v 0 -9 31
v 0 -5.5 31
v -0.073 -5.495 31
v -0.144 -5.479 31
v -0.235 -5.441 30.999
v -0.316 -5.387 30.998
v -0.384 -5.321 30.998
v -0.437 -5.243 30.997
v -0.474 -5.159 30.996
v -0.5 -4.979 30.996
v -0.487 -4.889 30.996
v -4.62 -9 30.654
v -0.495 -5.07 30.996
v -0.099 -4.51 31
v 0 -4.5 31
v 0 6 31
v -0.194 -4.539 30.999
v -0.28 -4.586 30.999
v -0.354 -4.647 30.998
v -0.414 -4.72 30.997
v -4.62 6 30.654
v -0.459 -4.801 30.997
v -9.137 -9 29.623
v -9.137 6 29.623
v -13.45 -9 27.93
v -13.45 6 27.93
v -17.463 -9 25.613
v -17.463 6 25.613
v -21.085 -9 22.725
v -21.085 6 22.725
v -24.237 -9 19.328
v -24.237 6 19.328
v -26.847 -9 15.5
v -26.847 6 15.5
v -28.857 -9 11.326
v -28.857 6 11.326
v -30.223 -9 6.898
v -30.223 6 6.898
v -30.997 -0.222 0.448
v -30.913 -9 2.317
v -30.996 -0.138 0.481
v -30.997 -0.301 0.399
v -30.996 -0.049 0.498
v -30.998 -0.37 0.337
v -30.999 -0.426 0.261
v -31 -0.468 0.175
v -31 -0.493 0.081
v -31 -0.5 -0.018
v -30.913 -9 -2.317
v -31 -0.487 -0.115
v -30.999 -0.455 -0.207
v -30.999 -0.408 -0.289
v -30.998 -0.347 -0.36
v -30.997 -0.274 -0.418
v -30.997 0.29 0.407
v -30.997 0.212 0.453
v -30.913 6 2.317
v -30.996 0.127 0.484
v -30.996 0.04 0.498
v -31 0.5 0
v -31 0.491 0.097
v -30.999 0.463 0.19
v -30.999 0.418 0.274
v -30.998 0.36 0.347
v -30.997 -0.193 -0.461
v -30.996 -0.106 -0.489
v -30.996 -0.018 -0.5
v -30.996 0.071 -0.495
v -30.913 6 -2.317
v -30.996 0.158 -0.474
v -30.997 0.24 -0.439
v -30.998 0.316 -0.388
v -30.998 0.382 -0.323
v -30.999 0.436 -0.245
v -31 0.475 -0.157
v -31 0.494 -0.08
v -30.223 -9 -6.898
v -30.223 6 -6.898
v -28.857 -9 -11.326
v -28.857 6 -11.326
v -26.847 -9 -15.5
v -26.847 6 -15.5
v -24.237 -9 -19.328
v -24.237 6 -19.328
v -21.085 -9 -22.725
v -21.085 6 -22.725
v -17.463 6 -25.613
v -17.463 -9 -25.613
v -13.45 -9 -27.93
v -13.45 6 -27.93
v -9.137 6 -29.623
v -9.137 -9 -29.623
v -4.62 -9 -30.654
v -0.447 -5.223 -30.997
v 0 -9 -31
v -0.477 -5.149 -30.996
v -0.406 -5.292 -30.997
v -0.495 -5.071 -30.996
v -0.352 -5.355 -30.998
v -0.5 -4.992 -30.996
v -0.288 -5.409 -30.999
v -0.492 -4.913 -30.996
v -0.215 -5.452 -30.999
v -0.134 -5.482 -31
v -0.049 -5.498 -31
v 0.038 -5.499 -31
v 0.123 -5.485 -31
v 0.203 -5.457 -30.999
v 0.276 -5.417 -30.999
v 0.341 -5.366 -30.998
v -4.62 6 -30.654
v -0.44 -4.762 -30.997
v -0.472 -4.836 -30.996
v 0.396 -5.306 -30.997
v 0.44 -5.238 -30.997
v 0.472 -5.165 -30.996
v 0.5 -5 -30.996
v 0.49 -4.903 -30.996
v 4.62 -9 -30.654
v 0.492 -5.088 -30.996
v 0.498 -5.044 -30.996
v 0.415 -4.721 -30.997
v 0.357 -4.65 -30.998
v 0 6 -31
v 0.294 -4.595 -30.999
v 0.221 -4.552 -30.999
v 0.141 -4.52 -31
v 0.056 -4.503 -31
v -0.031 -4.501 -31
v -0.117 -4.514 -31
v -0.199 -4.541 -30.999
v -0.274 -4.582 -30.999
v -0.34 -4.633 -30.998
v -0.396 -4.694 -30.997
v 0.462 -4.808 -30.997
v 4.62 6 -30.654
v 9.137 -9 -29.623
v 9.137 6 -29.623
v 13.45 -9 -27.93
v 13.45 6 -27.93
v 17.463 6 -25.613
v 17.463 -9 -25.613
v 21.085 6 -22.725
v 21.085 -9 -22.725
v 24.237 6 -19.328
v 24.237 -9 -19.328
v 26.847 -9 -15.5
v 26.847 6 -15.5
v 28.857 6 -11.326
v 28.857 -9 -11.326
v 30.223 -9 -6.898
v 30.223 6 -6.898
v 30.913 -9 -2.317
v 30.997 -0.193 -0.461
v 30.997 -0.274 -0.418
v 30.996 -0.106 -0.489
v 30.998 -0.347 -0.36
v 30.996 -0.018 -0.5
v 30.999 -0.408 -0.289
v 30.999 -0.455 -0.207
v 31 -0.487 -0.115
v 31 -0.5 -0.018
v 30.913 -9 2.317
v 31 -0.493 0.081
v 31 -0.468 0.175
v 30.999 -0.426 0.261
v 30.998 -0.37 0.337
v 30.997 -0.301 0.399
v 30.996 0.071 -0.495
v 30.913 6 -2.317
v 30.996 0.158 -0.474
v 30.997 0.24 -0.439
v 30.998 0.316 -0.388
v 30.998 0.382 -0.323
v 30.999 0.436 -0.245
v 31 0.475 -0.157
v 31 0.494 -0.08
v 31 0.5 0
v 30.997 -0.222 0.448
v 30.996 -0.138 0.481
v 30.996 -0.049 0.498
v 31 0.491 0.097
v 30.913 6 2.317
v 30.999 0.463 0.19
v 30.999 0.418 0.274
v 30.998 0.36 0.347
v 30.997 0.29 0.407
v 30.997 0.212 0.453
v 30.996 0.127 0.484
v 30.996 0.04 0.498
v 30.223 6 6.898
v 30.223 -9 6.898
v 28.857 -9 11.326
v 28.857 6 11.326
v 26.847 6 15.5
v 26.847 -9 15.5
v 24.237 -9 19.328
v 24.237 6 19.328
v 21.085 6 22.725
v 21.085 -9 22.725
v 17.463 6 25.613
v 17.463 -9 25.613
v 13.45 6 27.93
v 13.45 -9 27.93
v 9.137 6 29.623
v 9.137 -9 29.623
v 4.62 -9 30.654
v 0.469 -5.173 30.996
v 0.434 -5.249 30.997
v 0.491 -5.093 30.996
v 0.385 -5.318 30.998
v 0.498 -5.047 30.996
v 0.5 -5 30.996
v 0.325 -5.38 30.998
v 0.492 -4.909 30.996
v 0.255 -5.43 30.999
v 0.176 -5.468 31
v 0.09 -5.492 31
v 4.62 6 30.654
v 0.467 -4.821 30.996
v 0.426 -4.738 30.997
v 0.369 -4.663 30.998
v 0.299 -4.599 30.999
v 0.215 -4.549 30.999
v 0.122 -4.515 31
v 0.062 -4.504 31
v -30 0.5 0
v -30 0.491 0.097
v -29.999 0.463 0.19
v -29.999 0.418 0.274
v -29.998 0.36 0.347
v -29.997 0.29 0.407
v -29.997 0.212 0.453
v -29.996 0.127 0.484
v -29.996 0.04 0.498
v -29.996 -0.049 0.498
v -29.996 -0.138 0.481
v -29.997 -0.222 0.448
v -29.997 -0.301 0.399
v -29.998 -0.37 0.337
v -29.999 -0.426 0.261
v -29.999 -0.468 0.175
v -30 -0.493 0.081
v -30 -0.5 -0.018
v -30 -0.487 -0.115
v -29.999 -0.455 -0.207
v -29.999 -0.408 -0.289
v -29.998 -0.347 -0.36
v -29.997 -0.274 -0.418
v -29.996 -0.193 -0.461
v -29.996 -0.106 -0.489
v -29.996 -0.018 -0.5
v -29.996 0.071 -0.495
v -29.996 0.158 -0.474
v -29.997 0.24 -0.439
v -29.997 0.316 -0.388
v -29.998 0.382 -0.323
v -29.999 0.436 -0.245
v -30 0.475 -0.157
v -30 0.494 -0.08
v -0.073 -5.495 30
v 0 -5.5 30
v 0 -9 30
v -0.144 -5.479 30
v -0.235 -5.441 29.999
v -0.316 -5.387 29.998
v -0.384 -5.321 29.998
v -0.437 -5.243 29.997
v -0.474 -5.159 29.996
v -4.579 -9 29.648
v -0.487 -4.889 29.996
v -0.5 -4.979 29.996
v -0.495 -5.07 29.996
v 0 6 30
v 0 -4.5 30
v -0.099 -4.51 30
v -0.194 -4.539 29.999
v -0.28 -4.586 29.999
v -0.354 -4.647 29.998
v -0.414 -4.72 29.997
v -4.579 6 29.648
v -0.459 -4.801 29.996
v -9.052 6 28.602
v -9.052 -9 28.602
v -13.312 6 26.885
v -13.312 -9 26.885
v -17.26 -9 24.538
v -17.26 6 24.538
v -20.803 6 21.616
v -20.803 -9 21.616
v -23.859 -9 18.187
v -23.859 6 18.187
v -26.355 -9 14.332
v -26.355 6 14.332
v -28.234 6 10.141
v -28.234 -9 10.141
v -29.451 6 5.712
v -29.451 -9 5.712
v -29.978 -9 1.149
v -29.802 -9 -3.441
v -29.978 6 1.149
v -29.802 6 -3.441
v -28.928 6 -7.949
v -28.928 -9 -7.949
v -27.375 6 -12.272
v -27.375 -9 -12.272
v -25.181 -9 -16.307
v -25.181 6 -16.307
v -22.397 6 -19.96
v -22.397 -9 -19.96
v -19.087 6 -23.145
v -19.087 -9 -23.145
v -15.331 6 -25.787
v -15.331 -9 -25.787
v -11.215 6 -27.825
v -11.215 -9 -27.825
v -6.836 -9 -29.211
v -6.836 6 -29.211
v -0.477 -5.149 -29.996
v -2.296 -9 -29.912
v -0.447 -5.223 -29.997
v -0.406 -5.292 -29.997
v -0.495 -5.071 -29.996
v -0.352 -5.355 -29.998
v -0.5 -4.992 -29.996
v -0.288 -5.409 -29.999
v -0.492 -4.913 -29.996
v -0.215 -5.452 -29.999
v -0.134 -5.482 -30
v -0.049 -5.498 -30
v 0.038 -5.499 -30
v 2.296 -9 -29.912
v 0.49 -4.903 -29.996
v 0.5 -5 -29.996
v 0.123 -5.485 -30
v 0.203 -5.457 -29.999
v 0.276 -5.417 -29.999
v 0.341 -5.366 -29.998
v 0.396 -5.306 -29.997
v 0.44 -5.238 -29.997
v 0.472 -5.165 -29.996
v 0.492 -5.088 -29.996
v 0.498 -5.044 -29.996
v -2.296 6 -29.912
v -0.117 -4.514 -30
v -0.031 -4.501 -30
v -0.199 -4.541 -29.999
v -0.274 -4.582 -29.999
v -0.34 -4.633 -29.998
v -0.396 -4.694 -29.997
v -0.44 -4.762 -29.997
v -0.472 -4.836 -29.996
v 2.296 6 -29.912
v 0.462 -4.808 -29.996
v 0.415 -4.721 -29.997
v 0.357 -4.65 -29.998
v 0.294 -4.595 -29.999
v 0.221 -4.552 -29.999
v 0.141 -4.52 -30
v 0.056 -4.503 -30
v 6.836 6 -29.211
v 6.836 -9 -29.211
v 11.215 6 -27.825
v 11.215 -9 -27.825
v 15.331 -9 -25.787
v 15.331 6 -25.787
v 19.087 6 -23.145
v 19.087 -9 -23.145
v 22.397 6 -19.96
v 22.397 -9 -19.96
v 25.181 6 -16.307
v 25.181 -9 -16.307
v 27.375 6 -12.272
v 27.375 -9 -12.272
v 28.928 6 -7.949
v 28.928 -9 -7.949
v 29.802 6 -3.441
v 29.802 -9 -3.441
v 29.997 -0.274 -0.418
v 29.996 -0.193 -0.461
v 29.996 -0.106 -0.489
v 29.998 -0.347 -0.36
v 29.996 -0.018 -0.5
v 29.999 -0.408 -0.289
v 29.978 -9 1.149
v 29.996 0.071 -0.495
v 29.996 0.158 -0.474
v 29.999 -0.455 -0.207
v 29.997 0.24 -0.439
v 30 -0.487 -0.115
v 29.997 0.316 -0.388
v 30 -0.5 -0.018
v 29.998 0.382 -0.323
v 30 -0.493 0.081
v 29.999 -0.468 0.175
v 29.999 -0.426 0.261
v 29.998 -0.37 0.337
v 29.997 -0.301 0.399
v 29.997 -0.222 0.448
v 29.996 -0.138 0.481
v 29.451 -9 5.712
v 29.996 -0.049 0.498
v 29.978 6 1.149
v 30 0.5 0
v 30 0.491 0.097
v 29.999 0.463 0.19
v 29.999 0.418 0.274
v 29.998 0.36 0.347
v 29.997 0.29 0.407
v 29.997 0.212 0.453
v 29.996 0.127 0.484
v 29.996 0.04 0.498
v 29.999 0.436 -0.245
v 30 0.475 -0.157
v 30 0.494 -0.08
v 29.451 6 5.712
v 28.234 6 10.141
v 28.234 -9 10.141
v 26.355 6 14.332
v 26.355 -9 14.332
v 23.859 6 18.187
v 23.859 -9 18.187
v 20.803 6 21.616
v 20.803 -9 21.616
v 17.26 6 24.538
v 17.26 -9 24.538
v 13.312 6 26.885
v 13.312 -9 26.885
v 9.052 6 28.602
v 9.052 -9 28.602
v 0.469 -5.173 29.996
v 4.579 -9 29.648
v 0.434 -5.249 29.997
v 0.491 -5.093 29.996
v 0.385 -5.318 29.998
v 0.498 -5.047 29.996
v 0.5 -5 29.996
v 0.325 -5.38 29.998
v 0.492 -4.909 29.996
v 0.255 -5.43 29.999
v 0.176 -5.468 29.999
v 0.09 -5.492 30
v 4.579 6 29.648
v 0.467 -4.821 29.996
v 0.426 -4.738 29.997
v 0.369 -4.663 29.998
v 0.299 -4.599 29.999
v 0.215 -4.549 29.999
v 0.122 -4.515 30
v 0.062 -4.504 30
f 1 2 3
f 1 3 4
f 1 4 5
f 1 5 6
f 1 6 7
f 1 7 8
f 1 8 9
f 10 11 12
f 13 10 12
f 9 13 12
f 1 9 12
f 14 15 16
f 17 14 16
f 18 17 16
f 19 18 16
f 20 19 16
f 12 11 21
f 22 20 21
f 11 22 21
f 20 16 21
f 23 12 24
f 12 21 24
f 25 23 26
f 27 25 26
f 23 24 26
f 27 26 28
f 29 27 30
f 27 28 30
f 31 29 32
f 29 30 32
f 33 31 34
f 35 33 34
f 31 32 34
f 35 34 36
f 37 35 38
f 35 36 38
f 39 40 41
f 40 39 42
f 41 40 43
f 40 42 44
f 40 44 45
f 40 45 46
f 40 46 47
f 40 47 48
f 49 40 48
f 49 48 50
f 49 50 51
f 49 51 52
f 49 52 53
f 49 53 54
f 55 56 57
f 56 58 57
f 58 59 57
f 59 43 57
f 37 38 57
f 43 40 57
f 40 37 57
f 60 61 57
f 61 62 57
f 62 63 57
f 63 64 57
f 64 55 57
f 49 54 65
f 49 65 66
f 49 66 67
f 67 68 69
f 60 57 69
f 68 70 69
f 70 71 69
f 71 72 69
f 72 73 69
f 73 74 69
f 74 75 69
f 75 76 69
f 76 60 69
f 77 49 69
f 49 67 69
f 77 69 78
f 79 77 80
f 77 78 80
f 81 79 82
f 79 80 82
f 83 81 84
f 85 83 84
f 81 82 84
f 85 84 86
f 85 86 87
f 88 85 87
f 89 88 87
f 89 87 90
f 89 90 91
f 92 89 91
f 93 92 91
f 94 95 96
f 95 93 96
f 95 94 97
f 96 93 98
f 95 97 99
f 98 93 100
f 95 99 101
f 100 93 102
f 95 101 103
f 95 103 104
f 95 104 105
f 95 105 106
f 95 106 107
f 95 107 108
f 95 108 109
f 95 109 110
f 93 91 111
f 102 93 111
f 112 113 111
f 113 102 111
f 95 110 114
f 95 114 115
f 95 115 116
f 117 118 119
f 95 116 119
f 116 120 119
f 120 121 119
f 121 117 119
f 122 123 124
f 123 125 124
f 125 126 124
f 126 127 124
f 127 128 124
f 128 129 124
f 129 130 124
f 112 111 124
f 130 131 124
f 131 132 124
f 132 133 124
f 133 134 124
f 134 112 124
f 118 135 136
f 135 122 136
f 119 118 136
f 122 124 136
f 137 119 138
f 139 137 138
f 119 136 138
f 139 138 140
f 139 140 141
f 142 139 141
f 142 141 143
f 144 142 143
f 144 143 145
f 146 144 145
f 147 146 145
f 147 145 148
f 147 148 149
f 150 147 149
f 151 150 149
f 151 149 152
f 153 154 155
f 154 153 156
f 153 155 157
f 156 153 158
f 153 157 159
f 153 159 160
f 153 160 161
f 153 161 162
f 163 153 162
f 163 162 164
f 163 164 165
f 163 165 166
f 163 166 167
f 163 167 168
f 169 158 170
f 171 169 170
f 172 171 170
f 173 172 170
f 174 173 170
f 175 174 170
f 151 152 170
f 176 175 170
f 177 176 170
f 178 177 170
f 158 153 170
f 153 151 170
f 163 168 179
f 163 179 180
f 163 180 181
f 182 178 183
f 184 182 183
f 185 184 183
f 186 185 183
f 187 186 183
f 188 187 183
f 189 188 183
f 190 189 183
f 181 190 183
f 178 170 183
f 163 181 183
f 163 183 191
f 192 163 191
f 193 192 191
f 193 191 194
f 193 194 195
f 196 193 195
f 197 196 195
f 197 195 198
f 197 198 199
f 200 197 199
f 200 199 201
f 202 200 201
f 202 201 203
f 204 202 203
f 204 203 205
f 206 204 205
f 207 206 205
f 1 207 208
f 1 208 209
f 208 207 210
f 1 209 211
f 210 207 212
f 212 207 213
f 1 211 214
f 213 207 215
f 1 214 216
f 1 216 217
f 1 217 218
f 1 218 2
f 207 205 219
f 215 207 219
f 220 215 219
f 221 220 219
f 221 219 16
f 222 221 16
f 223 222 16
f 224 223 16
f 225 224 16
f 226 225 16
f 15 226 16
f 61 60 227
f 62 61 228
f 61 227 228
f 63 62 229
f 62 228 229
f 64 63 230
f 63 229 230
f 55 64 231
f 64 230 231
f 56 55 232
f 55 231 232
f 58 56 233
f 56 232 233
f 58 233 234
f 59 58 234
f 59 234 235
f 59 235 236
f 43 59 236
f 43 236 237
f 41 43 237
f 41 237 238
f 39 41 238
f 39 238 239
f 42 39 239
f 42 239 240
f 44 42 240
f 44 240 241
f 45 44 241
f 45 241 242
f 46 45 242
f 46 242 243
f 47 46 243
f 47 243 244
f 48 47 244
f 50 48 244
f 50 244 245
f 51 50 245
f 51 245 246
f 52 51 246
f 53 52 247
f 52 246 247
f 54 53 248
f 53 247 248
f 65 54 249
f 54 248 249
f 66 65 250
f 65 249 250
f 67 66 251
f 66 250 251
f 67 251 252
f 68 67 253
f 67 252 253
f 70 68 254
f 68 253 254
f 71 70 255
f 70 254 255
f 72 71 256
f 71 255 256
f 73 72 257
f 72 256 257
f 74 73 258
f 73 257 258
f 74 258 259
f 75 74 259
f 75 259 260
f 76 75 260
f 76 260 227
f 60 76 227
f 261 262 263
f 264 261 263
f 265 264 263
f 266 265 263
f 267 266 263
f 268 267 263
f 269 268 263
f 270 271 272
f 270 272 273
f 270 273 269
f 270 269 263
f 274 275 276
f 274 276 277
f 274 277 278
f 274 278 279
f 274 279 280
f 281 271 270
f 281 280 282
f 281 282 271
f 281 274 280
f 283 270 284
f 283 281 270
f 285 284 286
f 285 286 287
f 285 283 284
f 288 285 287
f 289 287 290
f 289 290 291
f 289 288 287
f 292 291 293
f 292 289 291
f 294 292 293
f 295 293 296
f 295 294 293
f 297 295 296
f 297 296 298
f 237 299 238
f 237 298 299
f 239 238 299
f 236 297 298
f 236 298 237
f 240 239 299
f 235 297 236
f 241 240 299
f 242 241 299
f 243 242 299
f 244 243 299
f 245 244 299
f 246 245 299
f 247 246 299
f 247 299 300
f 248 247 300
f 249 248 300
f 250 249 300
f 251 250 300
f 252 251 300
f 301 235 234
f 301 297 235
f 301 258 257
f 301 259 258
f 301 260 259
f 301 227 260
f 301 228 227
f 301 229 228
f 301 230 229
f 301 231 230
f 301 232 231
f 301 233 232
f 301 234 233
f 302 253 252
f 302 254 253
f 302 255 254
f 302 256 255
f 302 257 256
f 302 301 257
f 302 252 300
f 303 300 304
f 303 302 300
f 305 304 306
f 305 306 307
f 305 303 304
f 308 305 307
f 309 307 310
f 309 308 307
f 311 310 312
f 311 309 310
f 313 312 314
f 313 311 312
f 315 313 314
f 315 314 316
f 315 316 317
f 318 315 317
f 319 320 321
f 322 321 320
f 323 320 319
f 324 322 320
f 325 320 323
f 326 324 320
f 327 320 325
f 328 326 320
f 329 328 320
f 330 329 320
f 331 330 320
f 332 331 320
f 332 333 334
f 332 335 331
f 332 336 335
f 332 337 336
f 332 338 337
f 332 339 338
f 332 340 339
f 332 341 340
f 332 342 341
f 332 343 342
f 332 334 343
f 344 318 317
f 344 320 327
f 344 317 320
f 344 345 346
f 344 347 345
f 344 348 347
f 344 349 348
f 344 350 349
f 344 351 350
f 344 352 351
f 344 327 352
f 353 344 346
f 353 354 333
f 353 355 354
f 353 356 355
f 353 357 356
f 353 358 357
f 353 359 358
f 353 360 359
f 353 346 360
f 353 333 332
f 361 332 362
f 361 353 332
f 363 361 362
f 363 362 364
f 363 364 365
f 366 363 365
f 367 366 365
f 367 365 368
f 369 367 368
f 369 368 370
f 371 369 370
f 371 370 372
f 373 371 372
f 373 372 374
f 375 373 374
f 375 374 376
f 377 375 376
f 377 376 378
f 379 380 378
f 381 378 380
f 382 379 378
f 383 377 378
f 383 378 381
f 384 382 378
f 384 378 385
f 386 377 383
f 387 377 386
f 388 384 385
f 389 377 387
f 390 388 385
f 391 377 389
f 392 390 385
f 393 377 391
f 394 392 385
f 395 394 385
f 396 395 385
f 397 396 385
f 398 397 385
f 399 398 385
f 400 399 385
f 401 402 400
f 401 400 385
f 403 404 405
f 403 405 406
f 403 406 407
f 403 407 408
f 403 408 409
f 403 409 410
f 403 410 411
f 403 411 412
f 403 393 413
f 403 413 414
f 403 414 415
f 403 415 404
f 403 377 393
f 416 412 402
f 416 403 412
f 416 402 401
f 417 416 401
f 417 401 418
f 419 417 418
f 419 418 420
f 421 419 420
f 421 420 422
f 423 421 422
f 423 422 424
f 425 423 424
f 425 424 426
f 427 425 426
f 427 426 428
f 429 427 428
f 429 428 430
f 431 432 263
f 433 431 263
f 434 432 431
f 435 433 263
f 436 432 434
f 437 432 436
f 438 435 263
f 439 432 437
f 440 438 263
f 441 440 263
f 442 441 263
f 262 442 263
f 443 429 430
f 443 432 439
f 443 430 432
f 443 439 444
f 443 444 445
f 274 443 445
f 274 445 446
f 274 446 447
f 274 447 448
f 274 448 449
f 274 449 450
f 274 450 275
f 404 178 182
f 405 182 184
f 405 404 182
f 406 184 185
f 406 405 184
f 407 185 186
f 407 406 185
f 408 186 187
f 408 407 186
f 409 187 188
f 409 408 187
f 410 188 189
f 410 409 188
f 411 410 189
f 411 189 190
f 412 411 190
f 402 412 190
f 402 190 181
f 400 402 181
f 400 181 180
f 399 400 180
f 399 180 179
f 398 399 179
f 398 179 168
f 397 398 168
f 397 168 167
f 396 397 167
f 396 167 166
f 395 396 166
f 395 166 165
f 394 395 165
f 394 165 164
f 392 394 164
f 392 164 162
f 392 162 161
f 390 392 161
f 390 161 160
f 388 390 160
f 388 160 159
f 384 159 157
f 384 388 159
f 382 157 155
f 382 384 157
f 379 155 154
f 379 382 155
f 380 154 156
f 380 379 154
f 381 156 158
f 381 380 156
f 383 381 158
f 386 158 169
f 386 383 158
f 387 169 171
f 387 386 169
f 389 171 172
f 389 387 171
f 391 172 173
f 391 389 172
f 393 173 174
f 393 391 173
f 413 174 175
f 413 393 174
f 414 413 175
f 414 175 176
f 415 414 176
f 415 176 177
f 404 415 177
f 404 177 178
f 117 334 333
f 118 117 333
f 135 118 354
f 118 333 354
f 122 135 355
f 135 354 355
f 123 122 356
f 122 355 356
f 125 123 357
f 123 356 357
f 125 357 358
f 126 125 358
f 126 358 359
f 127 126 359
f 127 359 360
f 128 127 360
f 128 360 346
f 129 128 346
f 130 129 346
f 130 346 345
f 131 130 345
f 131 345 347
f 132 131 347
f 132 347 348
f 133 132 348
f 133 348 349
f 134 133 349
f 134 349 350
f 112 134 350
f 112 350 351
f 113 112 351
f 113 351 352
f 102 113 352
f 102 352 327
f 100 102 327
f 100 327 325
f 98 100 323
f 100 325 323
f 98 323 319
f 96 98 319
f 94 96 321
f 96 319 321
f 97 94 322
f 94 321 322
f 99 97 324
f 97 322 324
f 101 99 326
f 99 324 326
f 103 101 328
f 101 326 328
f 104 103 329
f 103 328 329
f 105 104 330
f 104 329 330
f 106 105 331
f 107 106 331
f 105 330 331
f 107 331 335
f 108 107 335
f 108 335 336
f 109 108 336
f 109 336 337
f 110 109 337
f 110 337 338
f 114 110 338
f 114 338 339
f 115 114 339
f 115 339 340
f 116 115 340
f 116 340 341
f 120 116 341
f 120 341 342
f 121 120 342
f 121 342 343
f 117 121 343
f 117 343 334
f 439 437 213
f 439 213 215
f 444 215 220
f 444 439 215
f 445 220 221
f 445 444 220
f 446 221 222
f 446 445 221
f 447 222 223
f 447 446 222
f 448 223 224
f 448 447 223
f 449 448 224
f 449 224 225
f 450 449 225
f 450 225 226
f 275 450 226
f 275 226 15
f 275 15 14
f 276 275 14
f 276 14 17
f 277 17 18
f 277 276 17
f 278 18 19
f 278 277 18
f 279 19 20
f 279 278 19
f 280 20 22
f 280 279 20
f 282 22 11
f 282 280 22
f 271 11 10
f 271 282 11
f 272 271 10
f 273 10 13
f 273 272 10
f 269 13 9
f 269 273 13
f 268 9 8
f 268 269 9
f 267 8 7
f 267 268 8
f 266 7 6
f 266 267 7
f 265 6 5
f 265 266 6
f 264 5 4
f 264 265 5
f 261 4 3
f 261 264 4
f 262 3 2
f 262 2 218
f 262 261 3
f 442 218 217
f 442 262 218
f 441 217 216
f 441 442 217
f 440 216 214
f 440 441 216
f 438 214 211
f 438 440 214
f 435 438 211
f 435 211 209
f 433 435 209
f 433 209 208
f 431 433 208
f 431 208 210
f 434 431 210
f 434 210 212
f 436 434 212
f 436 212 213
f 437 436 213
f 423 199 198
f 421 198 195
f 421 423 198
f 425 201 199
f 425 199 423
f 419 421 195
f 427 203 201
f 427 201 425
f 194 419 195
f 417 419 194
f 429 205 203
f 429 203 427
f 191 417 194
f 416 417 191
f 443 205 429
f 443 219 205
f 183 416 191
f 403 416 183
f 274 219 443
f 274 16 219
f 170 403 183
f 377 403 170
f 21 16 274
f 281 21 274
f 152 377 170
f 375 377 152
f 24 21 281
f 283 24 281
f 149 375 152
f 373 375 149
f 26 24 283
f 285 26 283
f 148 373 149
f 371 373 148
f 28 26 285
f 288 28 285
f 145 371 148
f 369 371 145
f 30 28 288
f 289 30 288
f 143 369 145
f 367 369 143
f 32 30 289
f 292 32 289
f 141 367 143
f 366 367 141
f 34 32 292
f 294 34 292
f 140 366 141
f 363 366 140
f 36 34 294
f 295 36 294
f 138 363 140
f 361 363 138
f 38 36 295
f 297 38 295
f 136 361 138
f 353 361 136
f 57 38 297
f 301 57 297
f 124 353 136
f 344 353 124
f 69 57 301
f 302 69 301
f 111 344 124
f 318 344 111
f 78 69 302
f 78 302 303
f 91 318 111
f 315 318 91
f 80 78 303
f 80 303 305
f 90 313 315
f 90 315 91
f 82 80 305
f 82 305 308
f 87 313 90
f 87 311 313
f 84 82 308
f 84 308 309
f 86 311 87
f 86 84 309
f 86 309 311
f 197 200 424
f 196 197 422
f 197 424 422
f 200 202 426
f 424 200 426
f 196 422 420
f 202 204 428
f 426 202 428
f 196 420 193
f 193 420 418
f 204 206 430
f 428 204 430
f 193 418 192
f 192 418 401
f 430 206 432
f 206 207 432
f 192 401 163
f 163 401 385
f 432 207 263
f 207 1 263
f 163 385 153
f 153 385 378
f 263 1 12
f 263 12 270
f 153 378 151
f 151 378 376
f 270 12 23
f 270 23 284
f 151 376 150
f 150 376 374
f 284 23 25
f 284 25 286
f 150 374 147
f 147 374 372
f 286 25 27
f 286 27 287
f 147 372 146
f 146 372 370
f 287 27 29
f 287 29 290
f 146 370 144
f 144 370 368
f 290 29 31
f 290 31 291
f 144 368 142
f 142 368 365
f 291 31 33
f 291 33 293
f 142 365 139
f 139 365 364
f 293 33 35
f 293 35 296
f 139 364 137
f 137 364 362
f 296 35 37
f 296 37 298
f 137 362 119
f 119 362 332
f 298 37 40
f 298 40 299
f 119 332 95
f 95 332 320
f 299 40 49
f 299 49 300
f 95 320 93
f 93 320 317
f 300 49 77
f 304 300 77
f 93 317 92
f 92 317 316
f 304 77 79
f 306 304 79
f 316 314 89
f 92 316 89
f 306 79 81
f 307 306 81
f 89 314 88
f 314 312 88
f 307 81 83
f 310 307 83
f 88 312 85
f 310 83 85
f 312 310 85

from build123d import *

# Parameters (mm, degrees)
F0_W          = 15
F0_H          = 1
F2_R          = 0.5
F3_DEPTH      = 31.001
F3_DEPTH_BACK = 31.001
F4_R          = 0.5
F5_DEPTH      = 31.0010001
F5_DEPTH_BACK = 31.0010001


with BuildPart() as f1:
    # F0 (on Right) → F1 (revolve)
    with BuildSketch(Plane.YZ):
        with Locations((-1.5, 30.5)):
            Rectangle(F0_W, F0_H)
    revolve(axis=Axis((0, 3, 0), (0, -1, 0)))

    # F2 (on Right) → F3 (cut, two sides)
    with BuildSketch(Plane.YZ) as f3_sk:
        Circle(F2_R)
    extrude(amount=-F3_DEPTH, mode=Mode.SUBTRACT)
    extrude(f3_sk.sketch, amount=F3_DEPTH_BACK, mode=Mode.SUBTRACT)

    # F4 (on Top) → F5 (cut, two sides)
    with BuildSketch(Plane.XY) as f5_sk:
        with Locations((0, -5)):
            Circle(F4_R)
    extrude(amount=-F5_DEPTH, mode=Mode.SUBTRACT)
    extrude(f5_sk.sketch, amount=F5_DEPTH_BACK, mode=Mode.SUBTRACT)


solid = f1.part
